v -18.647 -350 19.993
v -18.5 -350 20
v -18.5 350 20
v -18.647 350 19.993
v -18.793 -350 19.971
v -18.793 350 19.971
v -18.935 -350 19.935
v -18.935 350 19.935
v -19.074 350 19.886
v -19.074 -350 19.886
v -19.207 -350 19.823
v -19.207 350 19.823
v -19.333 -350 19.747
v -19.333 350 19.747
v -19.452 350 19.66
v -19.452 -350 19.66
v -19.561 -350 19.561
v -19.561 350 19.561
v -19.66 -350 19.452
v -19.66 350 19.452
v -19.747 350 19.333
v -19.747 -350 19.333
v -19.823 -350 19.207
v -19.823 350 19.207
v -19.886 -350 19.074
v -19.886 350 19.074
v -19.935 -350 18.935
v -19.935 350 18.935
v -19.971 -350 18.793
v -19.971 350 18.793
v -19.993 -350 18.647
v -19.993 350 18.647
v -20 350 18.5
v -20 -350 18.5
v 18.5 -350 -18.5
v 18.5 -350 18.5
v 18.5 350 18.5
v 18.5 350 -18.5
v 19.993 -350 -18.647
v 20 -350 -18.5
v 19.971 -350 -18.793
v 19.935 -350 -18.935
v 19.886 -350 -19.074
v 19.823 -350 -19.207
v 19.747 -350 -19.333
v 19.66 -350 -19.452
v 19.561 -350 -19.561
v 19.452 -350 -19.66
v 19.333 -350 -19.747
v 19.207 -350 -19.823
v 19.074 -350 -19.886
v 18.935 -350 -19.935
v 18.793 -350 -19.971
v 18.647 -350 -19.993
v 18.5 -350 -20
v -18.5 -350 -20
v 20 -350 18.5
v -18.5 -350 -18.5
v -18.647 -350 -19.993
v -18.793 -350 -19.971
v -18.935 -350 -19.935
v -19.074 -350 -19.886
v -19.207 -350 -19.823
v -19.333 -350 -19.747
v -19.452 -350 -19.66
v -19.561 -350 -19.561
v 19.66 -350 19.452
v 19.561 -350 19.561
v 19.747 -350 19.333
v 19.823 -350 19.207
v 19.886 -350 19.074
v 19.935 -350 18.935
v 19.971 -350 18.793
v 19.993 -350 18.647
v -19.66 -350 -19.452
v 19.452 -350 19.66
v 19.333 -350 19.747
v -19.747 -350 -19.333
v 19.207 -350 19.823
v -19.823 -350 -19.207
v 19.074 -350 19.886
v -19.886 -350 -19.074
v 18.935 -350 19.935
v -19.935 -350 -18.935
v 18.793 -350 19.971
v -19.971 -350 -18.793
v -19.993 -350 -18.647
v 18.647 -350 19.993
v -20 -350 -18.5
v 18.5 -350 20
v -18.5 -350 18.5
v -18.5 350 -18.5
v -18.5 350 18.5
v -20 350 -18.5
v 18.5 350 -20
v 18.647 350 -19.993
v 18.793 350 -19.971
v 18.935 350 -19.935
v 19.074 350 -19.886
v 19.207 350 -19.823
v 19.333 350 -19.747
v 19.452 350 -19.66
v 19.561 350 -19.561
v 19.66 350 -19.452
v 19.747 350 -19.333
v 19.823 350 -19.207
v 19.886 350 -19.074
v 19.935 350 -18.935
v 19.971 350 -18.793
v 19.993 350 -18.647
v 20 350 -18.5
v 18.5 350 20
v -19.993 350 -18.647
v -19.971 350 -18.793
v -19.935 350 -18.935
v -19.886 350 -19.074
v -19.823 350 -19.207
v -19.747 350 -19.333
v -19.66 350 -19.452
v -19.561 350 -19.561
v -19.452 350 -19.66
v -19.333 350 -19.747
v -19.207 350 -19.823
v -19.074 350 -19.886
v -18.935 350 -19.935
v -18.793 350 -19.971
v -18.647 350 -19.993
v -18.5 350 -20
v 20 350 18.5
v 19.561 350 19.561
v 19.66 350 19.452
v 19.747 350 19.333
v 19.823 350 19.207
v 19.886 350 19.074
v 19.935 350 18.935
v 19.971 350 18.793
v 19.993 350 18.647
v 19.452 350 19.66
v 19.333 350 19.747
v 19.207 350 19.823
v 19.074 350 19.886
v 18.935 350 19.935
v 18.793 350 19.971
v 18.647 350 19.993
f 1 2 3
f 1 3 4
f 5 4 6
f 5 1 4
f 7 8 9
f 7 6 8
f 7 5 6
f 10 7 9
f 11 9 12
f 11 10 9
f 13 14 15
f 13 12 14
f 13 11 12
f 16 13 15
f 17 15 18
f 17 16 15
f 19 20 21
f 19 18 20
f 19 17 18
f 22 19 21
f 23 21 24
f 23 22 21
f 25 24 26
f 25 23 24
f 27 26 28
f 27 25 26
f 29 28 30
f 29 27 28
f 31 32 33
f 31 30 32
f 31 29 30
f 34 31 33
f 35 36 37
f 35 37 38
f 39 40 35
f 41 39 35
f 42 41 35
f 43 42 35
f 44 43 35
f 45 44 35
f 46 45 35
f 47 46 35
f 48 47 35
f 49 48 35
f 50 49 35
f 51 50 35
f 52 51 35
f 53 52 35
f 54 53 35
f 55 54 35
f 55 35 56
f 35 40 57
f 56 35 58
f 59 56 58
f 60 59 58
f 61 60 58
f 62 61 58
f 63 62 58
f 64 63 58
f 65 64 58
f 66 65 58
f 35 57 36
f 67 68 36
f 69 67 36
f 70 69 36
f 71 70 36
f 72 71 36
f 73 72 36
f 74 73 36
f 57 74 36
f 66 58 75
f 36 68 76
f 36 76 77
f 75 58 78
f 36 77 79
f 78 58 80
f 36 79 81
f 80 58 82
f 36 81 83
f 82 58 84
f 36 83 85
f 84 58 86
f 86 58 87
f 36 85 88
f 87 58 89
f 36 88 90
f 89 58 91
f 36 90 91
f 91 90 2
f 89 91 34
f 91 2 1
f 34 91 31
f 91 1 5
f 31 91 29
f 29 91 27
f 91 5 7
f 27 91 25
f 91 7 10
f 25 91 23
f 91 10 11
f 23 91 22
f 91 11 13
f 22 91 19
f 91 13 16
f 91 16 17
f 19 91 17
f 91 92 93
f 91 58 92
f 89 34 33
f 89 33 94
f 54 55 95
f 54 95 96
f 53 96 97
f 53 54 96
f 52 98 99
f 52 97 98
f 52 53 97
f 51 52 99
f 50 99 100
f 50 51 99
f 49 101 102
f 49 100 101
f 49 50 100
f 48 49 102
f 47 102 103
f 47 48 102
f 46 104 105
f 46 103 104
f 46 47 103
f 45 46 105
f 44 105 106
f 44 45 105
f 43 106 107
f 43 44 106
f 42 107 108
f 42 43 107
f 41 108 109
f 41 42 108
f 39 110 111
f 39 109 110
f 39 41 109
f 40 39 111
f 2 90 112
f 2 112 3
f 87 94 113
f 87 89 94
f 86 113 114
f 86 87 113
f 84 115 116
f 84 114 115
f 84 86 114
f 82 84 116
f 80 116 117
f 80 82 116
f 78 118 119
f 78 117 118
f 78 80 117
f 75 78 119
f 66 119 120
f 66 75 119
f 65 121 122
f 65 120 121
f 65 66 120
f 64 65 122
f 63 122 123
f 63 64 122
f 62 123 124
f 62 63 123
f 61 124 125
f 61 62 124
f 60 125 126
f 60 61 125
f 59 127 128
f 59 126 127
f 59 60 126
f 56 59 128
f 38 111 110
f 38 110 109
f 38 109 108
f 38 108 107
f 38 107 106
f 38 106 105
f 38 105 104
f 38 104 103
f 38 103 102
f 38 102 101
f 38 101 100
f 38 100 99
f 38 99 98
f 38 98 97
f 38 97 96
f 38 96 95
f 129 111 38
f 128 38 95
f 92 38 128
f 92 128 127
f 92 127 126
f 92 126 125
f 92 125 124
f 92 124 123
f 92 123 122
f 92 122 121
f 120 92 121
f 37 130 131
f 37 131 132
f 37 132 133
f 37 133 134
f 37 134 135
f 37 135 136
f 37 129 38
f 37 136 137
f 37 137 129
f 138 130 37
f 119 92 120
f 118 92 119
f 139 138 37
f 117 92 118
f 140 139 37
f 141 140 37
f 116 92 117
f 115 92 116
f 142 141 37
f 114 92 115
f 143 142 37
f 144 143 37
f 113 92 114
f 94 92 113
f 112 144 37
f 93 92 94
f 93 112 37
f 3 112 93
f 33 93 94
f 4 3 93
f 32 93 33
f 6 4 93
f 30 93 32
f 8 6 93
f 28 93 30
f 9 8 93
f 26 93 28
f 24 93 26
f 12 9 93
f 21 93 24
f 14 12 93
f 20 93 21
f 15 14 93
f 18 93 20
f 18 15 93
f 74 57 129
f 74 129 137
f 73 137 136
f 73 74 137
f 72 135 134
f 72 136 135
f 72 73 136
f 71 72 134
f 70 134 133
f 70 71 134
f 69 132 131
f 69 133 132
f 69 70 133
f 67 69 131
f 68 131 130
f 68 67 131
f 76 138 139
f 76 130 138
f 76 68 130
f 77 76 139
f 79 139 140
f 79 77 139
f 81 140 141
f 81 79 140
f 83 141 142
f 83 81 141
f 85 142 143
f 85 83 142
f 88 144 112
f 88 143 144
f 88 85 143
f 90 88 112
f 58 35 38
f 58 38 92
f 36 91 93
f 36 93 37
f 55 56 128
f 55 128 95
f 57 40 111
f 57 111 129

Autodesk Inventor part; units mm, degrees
ref_plane "YZ Plane" through (0, 0, 0) normal (1, 0, 0) x (0, 1, 0)
ref_plane "XZ Plane" through (0, 0, 0) normal (0, 1, 0) x (-1, 0, 0)
ref_plane "XY Plane" through (0, 0, 0) normal (0, 0, 1) x (1, 0, 0)
sketch "Esboço1" plane through (0, 0, 0) normal (0, 1, 0) x (-1, 0, 0)
  line L0 (-18.5, 20) -> (18.5, 20)
  line L1 (20, 18.5) -> (20, -18.5)
  line L2 (18.5, -20) -> (-18.5, -20)
  line L3 (-20, -18.5) -> (-20, 18.5)
  line L4 (-20, 20) -> (20, -20) construction
  line L5 (20, 20) -> (-20, -20) construction
  line L6 (-18.5, -18.5) -> (18.5, -18.5)
  line L7 (18.5, -18.5) -> (18.5, 18.5)
  line L8 (18.5, 18.5) -> (-18.5, 18.5)
  line L9 (-18.5, 18.5) -> (-18.5, -18.5)
  line L10 (-18.5, -18.5) -> (18.5, 18.5) construction
  line L11 (18.5, -18.5) -> (-18.5, 18.5) construction
  arc A0 (20, 18.5) -> (18.5, 20) centre (18.5, 18.5) ccw
  arc A1 (-18.5, 20) -> (-20, 18.5) centre (-18.5, 18.5) ccw
  arc A2 (-20, -18.5) -> (-18.5, -20) centre (-18.5, -18.5) ccw
  arc A3 (18.5, -20) -> (20, -18.5) centre (18.5, -18.5) ccw
  point P0 (0, 0)
  dimension "d0" = 40
  dimension "d1" = 40
  dimension "d2" = 1.5
  dimension "d3" = 1.5
extrude "Extrusão1" add sketch "Esboço1" along normal mid plane 700
equation "\"d3\" = d2"
properties part number "MSI-101" material "Aço inoxidável AISI 304"
